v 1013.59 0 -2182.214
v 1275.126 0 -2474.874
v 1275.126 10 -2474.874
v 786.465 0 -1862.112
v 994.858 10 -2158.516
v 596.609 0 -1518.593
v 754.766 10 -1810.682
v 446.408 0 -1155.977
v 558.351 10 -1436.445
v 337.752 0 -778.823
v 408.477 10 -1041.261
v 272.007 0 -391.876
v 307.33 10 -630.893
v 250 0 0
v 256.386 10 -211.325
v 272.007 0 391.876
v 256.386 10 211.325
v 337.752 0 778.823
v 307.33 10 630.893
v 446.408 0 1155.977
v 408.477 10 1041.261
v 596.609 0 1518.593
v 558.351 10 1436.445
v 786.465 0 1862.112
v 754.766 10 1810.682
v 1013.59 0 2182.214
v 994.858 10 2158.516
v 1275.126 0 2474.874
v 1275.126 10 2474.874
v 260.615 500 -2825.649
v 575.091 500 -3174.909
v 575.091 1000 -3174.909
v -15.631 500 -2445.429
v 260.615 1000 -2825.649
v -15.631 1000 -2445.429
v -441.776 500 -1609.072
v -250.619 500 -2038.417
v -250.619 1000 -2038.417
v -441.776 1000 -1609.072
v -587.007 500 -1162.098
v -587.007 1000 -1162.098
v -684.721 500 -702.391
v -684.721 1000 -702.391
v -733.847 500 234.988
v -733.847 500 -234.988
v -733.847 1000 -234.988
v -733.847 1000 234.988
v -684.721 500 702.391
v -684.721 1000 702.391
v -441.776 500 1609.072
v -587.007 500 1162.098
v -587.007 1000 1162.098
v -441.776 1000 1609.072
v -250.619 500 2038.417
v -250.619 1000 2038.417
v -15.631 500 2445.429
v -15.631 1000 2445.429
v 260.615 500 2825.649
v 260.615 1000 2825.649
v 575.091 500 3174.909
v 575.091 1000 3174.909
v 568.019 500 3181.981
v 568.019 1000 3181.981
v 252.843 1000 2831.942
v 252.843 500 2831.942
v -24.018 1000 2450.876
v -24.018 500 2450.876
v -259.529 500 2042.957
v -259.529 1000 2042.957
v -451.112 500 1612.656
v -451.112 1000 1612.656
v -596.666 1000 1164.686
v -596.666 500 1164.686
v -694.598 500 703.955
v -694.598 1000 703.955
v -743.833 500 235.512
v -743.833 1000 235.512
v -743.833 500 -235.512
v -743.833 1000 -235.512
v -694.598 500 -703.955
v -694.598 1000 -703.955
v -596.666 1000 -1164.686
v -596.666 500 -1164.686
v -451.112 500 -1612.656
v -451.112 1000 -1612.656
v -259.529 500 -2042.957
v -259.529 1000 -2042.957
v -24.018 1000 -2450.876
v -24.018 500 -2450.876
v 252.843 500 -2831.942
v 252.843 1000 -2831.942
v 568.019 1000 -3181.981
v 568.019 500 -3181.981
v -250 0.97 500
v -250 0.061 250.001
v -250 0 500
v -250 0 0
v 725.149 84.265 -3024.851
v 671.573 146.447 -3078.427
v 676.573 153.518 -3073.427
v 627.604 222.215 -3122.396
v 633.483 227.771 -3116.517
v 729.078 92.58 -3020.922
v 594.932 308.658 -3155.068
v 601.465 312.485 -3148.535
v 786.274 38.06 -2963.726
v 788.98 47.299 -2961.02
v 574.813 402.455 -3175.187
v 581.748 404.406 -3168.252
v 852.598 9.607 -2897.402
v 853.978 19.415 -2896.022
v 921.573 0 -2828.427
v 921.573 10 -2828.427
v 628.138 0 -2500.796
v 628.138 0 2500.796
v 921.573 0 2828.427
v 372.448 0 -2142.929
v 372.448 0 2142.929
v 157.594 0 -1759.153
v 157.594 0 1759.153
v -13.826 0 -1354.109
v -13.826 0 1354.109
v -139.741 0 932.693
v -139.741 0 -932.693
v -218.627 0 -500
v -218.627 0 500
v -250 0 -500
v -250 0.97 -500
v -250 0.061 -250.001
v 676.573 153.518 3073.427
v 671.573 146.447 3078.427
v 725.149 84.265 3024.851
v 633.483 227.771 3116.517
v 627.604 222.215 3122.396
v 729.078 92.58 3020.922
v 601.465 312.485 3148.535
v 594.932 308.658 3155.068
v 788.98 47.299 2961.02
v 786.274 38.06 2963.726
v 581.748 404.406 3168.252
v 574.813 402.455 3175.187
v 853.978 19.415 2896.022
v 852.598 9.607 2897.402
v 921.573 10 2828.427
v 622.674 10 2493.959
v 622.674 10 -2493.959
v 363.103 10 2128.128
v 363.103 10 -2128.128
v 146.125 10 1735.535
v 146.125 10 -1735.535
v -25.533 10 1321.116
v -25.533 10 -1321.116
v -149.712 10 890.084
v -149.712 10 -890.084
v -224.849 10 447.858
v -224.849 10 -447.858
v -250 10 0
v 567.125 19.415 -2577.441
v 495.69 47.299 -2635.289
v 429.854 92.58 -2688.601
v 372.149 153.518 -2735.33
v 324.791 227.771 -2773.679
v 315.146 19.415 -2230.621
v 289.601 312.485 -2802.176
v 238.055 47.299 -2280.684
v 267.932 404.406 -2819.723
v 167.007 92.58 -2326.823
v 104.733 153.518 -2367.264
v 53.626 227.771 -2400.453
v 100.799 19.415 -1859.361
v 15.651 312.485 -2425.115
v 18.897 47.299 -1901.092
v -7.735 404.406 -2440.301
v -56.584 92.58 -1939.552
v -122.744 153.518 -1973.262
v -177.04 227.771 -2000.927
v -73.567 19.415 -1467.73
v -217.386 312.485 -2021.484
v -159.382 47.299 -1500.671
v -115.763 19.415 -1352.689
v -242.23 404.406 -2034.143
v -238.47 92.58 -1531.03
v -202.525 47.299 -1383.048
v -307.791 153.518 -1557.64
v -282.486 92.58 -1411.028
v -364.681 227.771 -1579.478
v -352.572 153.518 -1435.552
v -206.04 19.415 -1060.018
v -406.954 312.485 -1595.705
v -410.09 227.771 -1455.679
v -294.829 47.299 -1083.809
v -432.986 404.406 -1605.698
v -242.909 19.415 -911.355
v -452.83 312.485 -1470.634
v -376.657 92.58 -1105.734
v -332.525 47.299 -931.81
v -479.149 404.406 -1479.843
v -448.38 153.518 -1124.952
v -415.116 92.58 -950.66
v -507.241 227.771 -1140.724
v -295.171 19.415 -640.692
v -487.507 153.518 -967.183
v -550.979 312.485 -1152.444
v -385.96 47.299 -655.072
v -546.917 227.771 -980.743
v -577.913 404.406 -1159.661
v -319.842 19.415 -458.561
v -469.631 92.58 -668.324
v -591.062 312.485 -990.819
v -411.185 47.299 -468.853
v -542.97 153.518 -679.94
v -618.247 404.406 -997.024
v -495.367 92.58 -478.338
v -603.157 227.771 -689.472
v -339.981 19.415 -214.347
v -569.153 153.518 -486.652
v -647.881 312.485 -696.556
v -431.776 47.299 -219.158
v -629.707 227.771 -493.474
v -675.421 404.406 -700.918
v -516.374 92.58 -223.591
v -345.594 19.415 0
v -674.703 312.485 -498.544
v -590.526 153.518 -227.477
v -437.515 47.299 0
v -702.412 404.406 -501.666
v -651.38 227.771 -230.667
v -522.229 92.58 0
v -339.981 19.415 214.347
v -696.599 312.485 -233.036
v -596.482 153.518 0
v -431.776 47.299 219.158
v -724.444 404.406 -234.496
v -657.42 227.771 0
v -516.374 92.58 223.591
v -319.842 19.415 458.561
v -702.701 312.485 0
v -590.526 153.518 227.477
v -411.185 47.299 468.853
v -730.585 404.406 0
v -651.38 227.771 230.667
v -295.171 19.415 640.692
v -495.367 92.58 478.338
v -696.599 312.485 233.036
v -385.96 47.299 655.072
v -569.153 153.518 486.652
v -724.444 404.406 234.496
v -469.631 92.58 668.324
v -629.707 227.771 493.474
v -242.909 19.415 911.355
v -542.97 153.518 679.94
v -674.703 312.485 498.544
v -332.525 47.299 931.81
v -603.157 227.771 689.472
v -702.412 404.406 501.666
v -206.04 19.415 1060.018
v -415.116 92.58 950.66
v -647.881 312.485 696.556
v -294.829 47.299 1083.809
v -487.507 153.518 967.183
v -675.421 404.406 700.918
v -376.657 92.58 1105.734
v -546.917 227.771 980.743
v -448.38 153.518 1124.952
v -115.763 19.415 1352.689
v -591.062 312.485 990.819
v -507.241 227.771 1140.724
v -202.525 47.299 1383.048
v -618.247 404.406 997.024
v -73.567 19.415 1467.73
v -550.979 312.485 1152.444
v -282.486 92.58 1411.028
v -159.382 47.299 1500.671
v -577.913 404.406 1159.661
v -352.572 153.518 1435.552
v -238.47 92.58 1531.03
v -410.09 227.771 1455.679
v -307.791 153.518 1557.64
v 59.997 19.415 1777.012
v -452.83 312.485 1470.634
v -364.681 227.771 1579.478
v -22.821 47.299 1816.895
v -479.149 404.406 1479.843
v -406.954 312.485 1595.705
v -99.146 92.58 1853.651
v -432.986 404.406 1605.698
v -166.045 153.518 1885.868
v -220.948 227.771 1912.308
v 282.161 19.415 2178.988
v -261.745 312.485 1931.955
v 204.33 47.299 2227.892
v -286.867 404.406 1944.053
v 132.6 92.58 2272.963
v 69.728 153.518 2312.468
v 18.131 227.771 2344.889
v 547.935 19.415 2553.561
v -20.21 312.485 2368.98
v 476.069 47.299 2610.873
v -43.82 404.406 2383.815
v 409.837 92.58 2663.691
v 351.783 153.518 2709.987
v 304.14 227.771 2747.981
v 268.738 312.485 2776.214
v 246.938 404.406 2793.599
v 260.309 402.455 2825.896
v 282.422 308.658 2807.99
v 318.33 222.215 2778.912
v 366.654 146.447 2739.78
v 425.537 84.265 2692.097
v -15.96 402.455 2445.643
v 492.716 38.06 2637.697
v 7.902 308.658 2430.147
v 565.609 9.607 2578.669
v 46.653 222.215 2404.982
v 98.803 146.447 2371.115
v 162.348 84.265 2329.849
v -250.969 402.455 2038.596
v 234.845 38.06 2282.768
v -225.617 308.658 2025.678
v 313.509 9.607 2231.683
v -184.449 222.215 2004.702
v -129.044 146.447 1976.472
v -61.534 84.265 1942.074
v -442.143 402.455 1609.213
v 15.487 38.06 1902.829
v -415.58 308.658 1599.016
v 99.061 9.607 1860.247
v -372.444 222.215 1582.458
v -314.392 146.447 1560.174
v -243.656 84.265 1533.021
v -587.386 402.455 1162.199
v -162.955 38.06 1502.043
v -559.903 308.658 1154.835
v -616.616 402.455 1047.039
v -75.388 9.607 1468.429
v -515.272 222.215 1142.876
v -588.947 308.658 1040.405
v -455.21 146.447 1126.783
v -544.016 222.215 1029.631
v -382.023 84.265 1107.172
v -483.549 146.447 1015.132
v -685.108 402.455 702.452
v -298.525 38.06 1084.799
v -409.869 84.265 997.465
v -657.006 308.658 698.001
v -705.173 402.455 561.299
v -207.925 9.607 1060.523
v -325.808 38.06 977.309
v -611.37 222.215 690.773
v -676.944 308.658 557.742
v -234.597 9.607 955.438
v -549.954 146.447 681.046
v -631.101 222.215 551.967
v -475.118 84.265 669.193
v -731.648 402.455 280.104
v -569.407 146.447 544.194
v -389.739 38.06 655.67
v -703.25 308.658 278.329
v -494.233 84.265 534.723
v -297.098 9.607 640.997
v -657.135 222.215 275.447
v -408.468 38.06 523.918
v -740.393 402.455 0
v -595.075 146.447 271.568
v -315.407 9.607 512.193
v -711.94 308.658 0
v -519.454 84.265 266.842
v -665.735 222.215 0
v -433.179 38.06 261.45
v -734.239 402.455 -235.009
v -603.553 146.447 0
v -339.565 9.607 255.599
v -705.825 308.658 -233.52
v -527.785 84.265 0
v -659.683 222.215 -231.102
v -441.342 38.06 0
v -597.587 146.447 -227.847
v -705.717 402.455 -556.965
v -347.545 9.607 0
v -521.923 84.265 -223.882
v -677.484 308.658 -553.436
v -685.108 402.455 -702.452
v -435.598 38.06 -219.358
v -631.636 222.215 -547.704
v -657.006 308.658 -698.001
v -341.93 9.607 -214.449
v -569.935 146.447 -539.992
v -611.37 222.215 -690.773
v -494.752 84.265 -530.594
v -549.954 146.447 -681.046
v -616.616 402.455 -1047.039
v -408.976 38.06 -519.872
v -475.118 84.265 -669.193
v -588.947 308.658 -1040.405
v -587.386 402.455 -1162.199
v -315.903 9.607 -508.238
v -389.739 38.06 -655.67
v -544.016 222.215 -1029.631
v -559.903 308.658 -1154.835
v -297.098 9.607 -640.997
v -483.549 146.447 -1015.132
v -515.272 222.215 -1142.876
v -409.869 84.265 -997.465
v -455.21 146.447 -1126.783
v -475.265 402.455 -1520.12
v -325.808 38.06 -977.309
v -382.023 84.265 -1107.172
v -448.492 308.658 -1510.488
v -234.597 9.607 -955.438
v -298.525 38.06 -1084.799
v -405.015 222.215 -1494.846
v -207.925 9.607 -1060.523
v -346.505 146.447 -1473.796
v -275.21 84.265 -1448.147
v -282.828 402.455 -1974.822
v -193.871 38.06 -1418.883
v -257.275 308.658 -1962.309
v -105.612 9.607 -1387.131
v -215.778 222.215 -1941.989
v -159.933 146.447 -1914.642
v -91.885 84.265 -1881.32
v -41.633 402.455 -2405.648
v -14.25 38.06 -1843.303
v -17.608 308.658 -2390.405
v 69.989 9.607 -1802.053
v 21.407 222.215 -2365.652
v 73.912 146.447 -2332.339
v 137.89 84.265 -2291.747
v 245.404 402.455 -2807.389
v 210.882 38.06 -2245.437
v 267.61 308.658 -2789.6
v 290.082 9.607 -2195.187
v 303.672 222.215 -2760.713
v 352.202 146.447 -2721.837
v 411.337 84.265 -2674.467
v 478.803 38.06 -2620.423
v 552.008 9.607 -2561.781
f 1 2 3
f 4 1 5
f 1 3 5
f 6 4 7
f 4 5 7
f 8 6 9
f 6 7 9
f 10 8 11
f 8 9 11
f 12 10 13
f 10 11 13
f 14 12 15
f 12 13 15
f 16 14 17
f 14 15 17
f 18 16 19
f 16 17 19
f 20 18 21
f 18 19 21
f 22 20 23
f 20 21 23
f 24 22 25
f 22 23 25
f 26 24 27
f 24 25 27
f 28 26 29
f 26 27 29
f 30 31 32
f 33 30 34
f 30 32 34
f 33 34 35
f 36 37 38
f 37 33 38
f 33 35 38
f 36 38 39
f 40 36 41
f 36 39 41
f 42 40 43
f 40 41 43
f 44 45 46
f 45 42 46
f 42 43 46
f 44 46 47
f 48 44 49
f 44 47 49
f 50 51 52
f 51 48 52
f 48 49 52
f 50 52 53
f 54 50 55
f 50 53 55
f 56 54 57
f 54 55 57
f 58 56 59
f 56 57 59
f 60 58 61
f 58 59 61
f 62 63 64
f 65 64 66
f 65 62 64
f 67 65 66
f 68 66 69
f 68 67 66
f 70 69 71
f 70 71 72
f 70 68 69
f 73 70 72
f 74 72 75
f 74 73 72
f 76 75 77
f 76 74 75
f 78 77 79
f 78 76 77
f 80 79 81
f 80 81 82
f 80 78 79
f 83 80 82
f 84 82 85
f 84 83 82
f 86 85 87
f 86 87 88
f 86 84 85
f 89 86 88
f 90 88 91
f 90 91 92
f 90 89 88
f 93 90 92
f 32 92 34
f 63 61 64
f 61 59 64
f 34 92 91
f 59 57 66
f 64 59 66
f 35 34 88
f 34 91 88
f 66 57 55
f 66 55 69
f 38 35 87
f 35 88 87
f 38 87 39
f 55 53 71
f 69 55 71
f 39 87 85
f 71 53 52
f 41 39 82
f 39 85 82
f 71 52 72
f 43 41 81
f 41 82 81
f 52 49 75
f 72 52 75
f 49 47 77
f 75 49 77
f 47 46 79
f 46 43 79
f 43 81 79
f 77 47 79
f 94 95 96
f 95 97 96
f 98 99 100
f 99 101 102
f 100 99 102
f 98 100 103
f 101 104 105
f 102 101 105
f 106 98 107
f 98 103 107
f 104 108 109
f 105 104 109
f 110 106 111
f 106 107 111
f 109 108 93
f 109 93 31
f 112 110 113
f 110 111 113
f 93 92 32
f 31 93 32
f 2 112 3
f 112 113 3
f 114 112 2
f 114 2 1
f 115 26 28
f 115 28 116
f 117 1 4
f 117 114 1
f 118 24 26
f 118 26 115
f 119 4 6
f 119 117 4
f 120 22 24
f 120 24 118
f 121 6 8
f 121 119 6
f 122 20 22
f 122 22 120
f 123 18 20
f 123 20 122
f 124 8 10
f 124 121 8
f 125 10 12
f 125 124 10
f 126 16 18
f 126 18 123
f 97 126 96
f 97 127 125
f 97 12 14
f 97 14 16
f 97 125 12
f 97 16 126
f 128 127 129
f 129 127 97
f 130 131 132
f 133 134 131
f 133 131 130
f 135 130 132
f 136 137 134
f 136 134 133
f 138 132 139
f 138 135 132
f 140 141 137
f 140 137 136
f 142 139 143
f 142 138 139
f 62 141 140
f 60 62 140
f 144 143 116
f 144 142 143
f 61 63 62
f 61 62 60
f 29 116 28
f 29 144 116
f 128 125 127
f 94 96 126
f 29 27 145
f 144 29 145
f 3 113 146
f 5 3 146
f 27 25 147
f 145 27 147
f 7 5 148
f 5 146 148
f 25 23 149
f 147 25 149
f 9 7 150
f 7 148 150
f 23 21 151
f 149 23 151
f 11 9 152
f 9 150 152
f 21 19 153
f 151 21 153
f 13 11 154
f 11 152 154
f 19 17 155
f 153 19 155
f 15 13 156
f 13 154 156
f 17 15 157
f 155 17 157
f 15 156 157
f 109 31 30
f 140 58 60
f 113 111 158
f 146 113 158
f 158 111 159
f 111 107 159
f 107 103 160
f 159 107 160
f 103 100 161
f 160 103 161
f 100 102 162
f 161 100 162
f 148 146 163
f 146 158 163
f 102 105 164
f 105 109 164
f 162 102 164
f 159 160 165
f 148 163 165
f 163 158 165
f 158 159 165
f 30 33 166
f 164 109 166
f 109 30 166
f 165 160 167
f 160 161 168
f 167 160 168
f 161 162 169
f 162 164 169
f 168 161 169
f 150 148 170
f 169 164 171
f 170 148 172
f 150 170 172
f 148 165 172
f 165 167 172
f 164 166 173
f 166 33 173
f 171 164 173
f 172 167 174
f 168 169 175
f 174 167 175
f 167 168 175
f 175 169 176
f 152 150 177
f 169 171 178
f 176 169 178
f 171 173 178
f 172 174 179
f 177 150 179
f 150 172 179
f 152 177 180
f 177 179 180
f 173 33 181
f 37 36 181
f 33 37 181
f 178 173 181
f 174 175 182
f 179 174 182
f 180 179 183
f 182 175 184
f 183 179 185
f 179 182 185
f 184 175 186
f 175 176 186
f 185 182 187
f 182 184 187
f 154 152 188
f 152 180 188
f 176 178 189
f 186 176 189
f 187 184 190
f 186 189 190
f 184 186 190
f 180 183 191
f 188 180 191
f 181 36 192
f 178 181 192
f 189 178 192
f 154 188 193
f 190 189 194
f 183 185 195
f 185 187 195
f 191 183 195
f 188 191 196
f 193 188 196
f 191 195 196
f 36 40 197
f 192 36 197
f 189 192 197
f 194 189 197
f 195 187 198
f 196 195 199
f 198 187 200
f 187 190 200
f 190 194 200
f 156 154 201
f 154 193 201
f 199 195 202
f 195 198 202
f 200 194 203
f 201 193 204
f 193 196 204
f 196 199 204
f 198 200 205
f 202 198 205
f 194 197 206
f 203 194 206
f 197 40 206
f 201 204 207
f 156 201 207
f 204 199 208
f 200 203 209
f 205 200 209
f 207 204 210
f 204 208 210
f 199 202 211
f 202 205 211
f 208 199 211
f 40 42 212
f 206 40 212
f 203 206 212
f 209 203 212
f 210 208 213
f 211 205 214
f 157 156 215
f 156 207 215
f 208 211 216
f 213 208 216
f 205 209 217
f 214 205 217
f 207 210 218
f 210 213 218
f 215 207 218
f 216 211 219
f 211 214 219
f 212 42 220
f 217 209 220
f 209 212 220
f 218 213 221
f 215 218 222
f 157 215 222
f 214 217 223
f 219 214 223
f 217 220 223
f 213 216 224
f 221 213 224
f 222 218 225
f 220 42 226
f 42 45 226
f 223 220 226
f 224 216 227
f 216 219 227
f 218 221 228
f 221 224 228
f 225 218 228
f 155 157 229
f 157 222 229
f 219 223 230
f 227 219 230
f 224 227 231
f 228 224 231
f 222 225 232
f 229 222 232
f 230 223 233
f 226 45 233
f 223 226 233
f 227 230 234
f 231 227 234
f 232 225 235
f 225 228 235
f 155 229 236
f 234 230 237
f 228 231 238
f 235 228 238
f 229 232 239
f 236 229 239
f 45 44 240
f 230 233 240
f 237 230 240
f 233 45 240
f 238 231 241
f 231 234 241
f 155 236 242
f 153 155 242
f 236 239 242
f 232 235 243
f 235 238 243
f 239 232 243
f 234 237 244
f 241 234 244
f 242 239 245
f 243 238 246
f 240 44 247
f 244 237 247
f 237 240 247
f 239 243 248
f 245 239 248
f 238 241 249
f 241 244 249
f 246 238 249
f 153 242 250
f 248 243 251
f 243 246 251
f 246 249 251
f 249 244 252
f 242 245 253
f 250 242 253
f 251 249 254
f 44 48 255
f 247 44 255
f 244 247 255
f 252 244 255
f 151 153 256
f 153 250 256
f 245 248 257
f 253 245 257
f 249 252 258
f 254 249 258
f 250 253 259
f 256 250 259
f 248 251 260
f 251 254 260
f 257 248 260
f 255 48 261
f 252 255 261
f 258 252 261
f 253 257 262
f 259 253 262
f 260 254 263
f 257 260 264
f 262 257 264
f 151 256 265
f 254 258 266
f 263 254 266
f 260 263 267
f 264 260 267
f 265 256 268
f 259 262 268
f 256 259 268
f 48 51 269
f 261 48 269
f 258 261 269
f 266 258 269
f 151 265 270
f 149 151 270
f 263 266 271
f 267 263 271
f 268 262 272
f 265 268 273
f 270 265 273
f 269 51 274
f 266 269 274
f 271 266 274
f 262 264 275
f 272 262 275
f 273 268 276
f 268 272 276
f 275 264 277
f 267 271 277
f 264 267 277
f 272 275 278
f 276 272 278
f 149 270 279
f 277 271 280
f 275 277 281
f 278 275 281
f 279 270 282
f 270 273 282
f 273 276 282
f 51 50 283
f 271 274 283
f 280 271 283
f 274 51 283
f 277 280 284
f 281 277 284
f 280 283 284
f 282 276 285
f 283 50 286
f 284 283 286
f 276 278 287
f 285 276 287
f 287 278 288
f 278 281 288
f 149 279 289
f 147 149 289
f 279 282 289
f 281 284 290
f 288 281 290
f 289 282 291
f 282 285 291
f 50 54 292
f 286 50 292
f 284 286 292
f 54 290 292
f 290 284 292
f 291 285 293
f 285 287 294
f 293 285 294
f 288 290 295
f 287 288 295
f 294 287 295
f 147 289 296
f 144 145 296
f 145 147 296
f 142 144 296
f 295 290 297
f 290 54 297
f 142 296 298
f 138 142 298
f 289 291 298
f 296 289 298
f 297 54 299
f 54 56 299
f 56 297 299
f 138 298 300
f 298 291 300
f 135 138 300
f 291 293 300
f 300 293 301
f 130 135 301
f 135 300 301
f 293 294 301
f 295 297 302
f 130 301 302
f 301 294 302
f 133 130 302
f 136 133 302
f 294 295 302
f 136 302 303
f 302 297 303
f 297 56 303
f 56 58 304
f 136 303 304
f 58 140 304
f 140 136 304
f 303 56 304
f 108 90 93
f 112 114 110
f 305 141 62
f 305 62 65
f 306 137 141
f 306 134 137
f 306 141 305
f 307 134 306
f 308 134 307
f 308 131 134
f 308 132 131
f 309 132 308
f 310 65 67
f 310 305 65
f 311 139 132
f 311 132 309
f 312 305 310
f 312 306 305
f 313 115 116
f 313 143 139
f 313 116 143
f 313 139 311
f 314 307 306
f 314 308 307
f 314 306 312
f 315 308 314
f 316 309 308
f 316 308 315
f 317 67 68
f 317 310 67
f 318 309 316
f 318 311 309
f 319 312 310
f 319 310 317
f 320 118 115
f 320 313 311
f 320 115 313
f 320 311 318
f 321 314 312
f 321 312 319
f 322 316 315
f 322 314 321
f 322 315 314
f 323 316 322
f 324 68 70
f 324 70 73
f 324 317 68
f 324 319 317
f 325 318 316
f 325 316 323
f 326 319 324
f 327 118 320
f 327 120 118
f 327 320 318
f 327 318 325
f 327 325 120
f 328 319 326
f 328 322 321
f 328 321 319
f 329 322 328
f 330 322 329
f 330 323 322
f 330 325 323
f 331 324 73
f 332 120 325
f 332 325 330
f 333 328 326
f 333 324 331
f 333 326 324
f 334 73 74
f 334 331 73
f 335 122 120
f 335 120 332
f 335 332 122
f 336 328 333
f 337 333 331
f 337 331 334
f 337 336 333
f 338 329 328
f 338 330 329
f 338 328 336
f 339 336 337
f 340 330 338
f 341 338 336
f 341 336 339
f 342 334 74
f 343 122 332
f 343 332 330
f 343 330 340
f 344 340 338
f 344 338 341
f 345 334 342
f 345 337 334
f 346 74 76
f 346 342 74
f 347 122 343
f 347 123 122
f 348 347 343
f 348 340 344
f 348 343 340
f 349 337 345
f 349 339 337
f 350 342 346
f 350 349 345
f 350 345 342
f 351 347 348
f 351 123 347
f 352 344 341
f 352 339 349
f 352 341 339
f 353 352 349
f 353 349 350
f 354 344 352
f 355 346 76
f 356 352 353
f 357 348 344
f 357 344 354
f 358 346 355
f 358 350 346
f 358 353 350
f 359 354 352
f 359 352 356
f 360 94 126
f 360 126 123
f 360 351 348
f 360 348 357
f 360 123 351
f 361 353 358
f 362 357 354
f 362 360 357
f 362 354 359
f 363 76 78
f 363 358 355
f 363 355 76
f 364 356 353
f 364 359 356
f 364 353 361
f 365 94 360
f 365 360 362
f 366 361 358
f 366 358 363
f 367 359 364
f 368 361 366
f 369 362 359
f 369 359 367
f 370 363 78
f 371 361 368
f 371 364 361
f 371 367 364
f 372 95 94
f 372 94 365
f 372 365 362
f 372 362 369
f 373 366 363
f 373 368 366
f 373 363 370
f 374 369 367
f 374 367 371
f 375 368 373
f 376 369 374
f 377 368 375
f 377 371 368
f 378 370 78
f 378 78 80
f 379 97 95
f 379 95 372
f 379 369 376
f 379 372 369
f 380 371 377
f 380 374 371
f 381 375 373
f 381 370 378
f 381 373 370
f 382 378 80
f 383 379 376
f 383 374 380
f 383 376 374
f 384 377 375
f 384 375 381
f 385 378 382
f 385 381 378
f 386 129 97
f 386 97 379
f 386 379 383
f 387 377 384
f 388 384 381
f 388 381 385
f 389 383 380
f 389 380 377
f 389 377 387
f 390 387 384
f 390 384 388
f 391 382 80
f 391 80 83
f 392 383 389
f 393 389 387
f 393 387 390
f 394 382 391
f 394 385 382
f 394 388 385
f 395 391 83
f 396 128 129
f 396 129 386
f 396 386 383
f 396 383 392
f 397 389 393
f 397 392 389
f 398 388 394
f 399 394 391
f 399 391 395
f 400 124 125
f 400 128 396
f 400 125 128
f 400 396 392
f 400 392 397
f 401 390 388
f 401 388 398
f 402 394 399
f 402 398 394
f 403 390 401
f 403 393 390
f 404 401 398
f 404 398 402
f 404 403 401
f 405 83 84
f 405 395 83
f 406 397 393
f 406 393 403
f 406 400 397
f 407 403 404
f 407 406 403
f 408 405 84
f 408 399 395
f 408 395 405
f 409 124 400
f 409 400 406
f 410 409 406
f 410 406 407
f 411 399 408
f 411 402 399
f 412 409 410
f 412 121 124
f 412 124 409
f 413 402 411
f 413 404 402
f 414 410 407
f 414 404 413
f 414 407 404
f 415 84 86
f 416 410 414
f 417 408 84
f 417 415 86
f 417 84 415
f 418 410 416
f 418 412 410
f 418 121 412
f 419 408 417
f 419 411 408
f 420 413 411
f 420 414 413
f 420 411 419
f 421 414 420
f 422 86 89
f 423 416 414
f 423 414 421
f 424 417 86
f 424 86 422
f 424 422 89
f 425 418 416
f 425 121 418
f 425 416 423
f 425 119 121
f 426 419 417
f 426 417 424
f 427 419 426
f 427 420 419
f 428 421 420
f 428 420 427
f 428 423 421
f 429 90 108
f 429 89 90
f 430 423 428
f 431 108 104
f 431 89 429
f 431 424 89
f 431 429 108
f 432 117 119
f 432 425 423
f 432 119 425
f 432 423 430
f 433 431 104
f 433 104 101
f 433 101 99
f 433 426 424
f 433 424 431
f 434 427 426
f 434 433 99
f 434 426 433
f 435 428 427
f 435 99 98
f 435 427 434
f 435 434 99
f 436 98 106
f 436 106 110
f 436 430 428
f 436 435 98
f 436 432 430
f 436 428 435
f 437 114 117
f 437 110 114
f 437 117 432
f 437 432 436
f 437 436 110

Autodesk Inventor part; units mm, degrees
ref_plane "YZ Plane" through (0, 0, 0) normal (1, 0, 0) x (0, 1, 0)
ref_plane "XZ Plane" through (0, 0, 0) normal (0, 1, 0) x (-1, 0, 0)
ref_plane "XY Plane" through (0, 0, 0) normal (0, 0, 1) x (1, 0, 0)
sketch "Sketch1" plane through (0, 0, 0) normal (0, 1, 0) x (-1, 0, 0)
  line L0 (234.273325, 0) -> (-398.047733, 0)
  line L1 (0, 269.522777) -> (0, -364.967462)
  line L2 (250, 500) -> (-250, 500)
  line L3 (-250, 500) -> (-250, -500)
  line L4 (-250, -500) -> (250, -500)
  line L5 (250, -500) -> (250, 500)
  point P0 (0, 0)
  dimension "d0" = 1000
  dimension "d1" = 500
sketch "Sketch1 outline for Extrusion1" plane through (0, 0, 0) normal (0, 1, 0) x (-1, 0, 0)
  line L0 (250, -500) -> (250, 500)
  line L1 (-250, -500) -> (250, -500)
  line L2 (-250, 500) -> (-250, -500)
  line L3 (250, 500) -> (-250, 500)
extrude "Extrusion1" add sketch "Sketch1 outline for Extrusion1" along normal blind 10
fillet "Fillet1" radius 2 1 edges at (250, 10, 0)
sketch "Sketch4" plane through (0, 0, 0) normal (0, 0, 1) x (1, 0, 0)
  line L0 (-250, 0) -> (250, 0)
  arc A0 (-750, 500) -> (-250, 0) centre (-250, 500) ccw
  line L1 (-750, 500) -> (-750, 1000)
  line L2 (-250, 0) -> (-250, 10)
  line L3 (-787.939288, 1000) -> (-661.662469, 1000)
  line L4 (-740, 500) -> (-740, 1000)
  arc A1 (-740, 500) -> (-250, 10) centre (-250, 500) ccw
  line L5 (-250, 0) -> (-250, 10)
  line L6 (3750, 901.000805) -> (3750, -131.113672)
  line L7 (-250, 10) -> (250, 10)
  line L8 (-250, 10) -> (248, 10)
  line L9 (250, 10) -> (250, 0)
  line L10 (-250, 0) -> (250, 0)
  point P0 (0, 0)
  dimension "d17" = 500
  dimension "d18" = 10
  dimension "d19" = 1000
  dimension "d20" = 4000
sketch "Sketch4 outline for Revolution1" plane through (0, 0, 0) normal (0, 0, 1) x (1, 0, 0)
  arc A0 (-750, 500) -> (-250, 0) centre (-250, 500) ccw
  line L0 (-250, 0) -> (250, 0)
  line L1 (250, 0) -> (250, 10)
  line L2 (250, 10) -> (-250, 10)
  arc A1 (-250, 10) -> (-740, 500) centre (-250, 500) cw
  line L3 (-740, 500) -> (-740, 1000)
  line L4 (-740, 1000) -> (-750, 1000)
  line L5 (-750, 1000) -> (-750, 500)
revolve "Revolution1" add sketch "Sketch4 outline for Revolution1" angle 90 mid plane about axis through (3750, 901.000805, 0) along (0, -1, 0)
properties part number "baase" material "Stainless Steel"
